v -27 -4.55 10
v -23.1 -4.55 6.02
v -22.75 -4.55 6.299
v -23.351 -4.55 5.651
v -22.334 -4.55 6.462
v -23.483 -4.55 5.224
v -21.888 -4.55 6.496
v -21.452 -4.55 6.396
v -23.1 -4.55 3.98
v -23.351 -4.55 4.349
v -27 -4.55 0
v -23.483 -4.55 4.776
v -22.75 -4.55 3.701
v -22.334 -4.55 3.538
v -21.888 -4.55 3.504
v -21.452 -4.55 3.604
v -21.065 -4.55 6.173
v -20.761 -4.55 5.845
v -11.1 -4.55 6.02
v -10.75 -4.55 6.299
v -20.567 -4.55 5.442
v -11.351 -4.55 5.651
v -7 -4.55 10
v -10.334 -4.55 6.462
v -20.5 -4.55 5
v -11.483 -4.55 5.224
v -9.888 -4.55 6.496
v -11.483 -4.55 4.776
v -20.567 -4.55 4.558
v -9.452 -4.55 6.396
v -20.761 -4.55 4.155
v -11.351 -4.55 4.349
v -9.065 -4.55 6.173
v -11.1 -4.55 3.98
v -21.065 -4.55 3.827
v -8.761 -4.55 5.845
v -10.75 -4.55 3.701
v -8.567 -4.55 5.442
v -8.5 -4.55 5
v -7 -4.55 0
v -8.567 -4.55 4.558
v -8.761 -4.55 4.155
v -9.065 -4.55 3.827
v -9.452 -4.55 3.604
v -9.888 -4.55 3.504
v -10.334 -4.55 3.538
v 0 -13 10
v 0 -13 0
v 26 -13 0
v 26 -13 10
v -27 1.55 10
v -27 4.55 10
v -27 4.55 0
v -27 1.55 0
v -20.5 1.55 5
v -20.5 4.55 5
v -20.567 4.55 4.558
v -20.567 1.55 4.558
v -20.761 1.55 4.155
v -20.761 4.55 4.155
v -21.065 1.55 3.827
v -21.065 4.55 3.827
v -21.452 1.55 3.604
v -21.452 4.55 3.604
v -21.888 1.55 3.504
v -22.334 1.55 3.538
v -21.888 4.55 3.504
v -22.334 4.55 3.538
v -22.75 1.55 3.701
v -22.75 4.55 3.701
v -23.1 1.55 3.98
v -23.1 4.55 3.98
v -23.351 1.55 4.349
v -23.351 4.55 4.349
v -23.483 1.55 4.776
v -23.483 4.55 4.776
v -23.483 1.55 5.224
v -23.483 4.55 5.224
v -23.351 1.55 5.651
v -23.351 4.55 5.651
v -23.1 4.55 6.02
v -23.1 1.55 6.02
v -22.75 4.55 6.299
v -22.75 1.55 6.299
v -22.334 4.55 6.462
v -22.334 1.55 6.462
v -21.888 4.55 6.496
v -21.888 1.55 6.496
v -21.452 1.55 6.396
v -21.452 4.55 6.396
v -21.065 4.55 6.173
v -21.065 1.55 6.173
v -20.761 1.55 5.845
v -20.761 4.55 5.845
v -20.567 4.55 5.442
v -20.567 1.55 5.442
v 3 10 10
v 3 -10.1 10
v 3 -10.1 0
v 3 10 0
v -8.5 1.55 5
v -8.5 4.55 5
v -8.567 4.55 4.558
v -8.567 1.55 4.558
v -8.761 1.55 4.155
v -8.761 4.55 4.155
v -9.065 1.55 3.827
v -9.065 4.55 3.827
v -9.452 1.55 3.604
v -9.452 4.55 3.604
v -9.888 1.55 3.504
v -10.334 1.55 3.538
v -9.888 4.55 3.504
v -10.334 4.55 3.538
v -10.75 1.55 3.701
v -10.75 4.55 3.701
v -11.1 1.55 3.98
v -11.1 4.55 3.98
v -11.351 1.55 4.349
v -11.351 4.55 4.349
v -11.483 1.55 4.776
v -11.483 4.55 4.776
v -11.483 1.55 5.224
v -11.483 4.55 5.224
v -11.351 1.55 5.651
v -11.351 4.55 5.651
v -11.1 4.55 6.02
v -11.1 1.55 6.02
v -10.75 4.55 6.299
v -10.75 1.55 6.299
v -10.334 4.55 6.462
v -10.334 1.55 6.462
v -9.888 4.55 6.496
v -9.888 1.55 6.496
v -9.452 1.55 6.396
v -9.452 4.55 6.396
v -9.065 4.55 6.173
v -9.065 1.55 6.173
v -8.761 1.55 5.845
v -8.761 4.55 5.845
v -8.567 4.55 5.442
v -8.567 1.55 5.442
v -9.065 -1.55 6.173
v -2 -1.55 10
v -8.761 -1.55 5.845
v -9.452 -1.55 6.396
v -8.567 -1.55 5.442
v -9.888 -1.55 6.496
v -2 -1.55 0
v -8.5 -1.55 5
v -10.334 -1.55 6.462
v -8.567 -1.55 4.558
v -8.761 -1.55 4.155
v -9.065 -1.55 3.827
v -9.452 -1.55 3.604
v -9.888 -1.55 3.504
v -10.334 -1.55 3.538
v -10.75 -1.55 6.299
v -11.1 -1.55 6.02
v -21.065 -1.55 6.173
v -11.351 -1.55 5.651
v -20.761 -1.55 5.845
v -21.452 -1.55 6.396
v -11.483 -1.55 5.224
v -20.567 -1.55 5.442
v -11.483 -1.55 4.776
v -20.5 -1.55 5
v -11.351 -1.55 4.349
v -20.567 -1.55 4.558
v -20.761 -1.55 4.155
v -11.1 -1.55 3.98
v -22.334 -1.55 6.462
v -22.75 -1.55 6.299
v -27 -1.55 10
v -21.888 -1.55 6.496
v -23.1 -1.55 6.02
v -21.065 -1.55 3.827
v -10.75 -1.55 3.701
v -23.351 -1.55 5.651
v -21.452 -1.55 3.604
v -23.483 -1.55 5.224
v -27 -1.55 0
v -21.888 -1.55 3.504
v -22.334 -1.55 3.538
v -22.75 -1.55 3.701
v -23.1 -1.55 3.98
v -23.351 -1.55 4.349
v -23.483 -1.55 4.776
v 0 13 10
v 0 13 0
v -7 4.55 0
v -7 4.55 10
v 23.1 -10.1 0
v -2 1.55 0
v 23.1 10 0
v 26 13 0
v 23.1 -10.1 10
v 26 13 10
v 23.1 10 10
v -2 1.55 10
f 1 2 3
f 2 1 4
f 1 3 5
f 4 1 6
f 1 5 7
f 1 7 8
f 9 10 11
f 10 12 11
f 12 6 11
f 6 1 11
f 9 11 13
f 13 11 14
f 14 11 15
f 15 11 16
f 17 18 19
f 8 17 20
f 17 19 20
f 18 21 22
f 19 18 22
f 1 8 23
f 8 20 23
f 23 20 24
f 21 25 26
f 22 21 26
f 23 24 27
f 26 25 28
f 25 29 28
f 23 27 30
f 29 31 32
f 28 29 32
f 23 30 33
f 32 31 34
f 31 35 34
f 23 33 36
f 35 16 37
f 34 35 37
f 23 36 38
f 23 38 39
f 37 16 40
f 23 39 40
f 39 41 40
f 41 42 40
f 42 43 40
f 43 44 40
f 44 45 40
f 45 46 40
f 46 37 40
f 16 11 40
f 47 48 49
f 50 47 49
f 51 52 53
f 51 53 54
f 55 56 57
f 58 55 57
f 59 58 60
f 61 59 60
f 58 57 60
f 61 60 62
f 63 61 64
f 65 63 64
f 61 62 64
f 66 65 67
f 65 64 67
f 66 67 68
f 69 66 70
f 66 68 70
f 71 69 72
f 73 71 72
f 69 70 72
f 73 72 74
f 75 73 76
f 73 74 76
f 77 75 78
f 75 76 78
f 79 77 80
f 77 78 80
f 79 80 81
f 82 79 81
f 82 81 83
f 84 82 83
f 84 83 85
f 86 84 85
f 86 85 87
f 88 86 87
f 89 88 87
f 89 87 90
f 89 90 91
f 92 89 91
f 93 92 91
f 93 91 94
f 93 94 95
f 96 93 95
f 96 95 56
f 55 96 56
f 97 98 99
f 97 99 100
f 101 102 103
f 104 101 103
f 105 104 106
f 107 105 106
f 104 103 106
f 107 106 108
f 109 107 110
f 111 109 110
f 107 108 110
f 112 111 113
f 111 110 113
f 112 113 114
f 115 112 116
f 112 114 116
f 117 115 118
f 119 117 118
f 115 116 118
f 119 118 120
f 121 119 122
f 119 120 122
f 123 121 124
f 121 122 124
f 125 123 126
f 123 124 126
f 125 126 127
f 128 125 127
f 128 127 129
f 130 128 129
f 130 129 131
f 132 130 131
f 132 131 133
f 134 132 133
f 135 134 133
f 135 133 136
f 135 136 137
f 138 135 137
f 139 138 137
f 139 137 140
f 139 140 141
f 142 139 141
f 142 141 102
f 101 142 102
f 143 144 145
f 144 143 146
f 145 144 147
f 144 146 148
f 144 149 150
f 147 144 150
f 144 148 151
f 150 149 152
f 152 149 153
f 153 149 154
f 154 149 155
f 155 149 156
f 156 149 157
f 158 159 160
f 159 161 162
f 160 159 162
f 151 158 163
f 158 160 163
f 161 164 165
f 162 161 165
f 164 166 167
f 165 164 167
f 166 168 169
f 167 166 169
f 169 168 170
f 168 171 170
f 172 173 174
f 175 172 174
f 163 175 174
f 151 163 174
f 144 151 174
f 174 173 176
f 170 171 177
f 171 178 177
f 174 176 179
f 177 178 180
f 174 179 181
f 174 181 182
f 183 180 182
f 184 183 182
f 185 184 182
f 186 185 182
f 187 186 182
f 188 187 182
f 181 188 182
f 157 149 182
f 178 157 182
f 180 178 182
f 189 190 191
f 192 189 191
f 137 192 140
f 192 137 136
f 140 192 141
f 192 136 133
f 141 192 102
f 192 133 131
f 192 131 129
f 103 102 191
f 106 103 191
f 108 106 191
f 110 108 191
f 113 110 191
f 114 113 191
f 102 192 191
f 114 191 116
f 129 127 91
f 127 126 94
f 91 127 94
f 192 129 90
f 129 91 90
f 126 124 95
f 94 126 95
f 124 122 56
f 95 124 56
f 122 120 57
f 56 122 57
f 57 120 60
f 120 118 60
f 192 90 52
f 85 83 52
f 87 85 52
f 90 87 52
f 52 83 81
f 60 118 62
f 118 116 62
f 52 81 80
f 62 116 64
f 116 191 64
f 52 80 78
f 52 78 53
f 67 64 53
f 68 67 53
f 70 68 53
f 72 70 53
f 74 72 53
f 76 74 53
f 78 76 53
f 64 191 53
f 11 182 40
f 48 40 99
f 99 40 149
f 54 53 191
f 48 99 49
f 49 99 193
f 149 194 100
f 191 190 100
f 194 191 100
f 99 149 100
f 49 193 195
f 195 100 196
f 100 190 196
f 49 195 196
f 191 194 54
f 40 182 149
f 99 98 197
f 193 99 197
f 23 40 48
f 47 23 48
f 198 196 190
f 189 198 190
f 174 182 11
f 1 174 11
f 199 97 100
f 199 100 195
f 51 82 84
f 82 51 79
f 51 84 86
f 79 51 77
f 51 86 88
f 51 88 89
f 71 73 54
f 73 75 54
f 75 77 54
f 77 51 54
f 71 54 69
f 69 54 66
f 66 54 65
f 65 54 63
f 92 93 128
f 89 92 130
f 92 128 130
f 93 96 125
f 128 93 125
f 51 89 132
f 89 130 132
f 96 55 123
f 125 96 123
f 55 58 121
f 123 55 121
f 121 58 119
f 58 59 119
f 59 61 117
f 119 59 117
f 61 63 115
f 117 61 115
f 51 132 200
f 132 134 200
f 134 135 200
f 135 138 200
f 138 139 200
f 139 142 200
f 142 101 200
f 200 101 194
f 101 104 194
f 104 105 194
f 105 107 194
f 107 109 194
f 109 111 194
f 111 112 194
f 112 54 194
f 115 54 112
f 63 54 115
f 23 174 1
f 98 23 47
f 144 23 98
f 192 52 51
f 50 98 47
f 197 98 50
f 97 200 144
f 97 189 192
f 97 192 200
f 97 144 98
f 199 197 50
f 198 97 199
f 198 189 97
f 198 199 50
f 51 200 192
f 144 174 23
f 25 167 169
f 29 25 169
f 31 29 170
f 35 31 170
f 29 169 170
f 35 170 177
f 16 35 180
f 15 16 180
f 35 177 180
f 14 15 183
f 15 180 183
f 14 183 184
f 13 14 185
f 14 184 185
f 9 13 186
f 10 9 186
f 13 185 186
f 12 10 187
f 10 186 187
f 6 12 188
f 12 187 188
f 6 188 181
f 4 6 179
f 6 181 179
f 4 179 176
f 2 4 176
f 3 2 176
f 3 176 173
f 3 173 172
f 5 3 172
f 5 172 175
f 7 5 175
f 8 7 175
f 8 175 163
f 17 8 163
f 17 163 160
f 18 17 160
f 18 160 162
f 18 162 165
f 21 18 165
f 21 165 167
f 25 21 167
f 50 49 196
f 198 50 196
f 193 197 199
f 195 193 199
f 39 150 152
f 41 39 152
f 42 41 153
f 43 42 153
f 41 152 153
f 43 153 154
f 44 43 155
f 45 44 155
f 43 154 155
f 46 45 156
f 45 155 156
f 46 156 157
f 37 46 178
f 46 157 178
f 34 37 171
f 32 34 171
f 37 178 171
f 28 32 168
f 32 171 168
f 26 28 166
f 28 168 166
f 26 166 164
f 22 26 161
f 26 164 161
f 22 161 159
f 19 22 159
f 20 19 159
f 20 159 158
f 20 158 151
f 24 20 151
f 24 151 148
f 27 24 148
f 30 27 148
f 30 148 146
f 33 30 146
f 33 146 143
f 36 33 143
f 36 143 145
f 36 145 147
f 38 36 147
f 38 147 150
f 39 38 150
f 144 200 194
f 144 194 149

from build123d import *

# Parameters (mm, degrees)
EXTRUDE_1_DEPTH     = 10
SKETCH_5_W          = 20.1
SKETCH_5_H          = 20.1
CUT_EXTRUDE_1_DEPTH = 30
SKETCH_7_R          = 1.5
CUT_EXTRUDE_5_DEPTH = 9.1


with BuildPart() as part:
    # 草图1 → 凸台-拉伸1 (new body)
    with BuildSketch(Plane.XY):
        Polygon((-27, 4.55), (-27, 1.55), (-2, 1.55), (-2, -1.55), (-27, -1.55), (-27, -4.55), (-7, -4.55), (0, -13), (26, -13), (26, 13), (0, 13), (-7, 4.55), align=None)
    extrude(amount=EXTRUDE_1_DEPTH)

    # 草图5 → 切除-拉伸1 (cut)
    with BuildSketch(Plane.XY.offset(10)):
        with Locations((13.05, -0.05)):
            Rectangle(SKETCH_5_W, SKETCH_5_H)
    extrude(amount=-CUT_EXTRUDE_1_DEPTH, mode=Mode.SUBTRACT)

    # 草图7 → 切除-拉伸5 (cut)
    with BuildSketch(Plane(origin=(0, 4.55, 0), x_dir=(1, 0, 0), z_dir=(0, 1, 0))):
        with Locations((-22, -5)):
            Circle(SKETCH_7_R)
        with Locations((-10, -5)):
            Circle(SKETCH_7_R)
    extrude(amount=-CUT_EXTRUDE_5_DEPTH, mode=Mode.SUBTRACT)


solid = part.part
